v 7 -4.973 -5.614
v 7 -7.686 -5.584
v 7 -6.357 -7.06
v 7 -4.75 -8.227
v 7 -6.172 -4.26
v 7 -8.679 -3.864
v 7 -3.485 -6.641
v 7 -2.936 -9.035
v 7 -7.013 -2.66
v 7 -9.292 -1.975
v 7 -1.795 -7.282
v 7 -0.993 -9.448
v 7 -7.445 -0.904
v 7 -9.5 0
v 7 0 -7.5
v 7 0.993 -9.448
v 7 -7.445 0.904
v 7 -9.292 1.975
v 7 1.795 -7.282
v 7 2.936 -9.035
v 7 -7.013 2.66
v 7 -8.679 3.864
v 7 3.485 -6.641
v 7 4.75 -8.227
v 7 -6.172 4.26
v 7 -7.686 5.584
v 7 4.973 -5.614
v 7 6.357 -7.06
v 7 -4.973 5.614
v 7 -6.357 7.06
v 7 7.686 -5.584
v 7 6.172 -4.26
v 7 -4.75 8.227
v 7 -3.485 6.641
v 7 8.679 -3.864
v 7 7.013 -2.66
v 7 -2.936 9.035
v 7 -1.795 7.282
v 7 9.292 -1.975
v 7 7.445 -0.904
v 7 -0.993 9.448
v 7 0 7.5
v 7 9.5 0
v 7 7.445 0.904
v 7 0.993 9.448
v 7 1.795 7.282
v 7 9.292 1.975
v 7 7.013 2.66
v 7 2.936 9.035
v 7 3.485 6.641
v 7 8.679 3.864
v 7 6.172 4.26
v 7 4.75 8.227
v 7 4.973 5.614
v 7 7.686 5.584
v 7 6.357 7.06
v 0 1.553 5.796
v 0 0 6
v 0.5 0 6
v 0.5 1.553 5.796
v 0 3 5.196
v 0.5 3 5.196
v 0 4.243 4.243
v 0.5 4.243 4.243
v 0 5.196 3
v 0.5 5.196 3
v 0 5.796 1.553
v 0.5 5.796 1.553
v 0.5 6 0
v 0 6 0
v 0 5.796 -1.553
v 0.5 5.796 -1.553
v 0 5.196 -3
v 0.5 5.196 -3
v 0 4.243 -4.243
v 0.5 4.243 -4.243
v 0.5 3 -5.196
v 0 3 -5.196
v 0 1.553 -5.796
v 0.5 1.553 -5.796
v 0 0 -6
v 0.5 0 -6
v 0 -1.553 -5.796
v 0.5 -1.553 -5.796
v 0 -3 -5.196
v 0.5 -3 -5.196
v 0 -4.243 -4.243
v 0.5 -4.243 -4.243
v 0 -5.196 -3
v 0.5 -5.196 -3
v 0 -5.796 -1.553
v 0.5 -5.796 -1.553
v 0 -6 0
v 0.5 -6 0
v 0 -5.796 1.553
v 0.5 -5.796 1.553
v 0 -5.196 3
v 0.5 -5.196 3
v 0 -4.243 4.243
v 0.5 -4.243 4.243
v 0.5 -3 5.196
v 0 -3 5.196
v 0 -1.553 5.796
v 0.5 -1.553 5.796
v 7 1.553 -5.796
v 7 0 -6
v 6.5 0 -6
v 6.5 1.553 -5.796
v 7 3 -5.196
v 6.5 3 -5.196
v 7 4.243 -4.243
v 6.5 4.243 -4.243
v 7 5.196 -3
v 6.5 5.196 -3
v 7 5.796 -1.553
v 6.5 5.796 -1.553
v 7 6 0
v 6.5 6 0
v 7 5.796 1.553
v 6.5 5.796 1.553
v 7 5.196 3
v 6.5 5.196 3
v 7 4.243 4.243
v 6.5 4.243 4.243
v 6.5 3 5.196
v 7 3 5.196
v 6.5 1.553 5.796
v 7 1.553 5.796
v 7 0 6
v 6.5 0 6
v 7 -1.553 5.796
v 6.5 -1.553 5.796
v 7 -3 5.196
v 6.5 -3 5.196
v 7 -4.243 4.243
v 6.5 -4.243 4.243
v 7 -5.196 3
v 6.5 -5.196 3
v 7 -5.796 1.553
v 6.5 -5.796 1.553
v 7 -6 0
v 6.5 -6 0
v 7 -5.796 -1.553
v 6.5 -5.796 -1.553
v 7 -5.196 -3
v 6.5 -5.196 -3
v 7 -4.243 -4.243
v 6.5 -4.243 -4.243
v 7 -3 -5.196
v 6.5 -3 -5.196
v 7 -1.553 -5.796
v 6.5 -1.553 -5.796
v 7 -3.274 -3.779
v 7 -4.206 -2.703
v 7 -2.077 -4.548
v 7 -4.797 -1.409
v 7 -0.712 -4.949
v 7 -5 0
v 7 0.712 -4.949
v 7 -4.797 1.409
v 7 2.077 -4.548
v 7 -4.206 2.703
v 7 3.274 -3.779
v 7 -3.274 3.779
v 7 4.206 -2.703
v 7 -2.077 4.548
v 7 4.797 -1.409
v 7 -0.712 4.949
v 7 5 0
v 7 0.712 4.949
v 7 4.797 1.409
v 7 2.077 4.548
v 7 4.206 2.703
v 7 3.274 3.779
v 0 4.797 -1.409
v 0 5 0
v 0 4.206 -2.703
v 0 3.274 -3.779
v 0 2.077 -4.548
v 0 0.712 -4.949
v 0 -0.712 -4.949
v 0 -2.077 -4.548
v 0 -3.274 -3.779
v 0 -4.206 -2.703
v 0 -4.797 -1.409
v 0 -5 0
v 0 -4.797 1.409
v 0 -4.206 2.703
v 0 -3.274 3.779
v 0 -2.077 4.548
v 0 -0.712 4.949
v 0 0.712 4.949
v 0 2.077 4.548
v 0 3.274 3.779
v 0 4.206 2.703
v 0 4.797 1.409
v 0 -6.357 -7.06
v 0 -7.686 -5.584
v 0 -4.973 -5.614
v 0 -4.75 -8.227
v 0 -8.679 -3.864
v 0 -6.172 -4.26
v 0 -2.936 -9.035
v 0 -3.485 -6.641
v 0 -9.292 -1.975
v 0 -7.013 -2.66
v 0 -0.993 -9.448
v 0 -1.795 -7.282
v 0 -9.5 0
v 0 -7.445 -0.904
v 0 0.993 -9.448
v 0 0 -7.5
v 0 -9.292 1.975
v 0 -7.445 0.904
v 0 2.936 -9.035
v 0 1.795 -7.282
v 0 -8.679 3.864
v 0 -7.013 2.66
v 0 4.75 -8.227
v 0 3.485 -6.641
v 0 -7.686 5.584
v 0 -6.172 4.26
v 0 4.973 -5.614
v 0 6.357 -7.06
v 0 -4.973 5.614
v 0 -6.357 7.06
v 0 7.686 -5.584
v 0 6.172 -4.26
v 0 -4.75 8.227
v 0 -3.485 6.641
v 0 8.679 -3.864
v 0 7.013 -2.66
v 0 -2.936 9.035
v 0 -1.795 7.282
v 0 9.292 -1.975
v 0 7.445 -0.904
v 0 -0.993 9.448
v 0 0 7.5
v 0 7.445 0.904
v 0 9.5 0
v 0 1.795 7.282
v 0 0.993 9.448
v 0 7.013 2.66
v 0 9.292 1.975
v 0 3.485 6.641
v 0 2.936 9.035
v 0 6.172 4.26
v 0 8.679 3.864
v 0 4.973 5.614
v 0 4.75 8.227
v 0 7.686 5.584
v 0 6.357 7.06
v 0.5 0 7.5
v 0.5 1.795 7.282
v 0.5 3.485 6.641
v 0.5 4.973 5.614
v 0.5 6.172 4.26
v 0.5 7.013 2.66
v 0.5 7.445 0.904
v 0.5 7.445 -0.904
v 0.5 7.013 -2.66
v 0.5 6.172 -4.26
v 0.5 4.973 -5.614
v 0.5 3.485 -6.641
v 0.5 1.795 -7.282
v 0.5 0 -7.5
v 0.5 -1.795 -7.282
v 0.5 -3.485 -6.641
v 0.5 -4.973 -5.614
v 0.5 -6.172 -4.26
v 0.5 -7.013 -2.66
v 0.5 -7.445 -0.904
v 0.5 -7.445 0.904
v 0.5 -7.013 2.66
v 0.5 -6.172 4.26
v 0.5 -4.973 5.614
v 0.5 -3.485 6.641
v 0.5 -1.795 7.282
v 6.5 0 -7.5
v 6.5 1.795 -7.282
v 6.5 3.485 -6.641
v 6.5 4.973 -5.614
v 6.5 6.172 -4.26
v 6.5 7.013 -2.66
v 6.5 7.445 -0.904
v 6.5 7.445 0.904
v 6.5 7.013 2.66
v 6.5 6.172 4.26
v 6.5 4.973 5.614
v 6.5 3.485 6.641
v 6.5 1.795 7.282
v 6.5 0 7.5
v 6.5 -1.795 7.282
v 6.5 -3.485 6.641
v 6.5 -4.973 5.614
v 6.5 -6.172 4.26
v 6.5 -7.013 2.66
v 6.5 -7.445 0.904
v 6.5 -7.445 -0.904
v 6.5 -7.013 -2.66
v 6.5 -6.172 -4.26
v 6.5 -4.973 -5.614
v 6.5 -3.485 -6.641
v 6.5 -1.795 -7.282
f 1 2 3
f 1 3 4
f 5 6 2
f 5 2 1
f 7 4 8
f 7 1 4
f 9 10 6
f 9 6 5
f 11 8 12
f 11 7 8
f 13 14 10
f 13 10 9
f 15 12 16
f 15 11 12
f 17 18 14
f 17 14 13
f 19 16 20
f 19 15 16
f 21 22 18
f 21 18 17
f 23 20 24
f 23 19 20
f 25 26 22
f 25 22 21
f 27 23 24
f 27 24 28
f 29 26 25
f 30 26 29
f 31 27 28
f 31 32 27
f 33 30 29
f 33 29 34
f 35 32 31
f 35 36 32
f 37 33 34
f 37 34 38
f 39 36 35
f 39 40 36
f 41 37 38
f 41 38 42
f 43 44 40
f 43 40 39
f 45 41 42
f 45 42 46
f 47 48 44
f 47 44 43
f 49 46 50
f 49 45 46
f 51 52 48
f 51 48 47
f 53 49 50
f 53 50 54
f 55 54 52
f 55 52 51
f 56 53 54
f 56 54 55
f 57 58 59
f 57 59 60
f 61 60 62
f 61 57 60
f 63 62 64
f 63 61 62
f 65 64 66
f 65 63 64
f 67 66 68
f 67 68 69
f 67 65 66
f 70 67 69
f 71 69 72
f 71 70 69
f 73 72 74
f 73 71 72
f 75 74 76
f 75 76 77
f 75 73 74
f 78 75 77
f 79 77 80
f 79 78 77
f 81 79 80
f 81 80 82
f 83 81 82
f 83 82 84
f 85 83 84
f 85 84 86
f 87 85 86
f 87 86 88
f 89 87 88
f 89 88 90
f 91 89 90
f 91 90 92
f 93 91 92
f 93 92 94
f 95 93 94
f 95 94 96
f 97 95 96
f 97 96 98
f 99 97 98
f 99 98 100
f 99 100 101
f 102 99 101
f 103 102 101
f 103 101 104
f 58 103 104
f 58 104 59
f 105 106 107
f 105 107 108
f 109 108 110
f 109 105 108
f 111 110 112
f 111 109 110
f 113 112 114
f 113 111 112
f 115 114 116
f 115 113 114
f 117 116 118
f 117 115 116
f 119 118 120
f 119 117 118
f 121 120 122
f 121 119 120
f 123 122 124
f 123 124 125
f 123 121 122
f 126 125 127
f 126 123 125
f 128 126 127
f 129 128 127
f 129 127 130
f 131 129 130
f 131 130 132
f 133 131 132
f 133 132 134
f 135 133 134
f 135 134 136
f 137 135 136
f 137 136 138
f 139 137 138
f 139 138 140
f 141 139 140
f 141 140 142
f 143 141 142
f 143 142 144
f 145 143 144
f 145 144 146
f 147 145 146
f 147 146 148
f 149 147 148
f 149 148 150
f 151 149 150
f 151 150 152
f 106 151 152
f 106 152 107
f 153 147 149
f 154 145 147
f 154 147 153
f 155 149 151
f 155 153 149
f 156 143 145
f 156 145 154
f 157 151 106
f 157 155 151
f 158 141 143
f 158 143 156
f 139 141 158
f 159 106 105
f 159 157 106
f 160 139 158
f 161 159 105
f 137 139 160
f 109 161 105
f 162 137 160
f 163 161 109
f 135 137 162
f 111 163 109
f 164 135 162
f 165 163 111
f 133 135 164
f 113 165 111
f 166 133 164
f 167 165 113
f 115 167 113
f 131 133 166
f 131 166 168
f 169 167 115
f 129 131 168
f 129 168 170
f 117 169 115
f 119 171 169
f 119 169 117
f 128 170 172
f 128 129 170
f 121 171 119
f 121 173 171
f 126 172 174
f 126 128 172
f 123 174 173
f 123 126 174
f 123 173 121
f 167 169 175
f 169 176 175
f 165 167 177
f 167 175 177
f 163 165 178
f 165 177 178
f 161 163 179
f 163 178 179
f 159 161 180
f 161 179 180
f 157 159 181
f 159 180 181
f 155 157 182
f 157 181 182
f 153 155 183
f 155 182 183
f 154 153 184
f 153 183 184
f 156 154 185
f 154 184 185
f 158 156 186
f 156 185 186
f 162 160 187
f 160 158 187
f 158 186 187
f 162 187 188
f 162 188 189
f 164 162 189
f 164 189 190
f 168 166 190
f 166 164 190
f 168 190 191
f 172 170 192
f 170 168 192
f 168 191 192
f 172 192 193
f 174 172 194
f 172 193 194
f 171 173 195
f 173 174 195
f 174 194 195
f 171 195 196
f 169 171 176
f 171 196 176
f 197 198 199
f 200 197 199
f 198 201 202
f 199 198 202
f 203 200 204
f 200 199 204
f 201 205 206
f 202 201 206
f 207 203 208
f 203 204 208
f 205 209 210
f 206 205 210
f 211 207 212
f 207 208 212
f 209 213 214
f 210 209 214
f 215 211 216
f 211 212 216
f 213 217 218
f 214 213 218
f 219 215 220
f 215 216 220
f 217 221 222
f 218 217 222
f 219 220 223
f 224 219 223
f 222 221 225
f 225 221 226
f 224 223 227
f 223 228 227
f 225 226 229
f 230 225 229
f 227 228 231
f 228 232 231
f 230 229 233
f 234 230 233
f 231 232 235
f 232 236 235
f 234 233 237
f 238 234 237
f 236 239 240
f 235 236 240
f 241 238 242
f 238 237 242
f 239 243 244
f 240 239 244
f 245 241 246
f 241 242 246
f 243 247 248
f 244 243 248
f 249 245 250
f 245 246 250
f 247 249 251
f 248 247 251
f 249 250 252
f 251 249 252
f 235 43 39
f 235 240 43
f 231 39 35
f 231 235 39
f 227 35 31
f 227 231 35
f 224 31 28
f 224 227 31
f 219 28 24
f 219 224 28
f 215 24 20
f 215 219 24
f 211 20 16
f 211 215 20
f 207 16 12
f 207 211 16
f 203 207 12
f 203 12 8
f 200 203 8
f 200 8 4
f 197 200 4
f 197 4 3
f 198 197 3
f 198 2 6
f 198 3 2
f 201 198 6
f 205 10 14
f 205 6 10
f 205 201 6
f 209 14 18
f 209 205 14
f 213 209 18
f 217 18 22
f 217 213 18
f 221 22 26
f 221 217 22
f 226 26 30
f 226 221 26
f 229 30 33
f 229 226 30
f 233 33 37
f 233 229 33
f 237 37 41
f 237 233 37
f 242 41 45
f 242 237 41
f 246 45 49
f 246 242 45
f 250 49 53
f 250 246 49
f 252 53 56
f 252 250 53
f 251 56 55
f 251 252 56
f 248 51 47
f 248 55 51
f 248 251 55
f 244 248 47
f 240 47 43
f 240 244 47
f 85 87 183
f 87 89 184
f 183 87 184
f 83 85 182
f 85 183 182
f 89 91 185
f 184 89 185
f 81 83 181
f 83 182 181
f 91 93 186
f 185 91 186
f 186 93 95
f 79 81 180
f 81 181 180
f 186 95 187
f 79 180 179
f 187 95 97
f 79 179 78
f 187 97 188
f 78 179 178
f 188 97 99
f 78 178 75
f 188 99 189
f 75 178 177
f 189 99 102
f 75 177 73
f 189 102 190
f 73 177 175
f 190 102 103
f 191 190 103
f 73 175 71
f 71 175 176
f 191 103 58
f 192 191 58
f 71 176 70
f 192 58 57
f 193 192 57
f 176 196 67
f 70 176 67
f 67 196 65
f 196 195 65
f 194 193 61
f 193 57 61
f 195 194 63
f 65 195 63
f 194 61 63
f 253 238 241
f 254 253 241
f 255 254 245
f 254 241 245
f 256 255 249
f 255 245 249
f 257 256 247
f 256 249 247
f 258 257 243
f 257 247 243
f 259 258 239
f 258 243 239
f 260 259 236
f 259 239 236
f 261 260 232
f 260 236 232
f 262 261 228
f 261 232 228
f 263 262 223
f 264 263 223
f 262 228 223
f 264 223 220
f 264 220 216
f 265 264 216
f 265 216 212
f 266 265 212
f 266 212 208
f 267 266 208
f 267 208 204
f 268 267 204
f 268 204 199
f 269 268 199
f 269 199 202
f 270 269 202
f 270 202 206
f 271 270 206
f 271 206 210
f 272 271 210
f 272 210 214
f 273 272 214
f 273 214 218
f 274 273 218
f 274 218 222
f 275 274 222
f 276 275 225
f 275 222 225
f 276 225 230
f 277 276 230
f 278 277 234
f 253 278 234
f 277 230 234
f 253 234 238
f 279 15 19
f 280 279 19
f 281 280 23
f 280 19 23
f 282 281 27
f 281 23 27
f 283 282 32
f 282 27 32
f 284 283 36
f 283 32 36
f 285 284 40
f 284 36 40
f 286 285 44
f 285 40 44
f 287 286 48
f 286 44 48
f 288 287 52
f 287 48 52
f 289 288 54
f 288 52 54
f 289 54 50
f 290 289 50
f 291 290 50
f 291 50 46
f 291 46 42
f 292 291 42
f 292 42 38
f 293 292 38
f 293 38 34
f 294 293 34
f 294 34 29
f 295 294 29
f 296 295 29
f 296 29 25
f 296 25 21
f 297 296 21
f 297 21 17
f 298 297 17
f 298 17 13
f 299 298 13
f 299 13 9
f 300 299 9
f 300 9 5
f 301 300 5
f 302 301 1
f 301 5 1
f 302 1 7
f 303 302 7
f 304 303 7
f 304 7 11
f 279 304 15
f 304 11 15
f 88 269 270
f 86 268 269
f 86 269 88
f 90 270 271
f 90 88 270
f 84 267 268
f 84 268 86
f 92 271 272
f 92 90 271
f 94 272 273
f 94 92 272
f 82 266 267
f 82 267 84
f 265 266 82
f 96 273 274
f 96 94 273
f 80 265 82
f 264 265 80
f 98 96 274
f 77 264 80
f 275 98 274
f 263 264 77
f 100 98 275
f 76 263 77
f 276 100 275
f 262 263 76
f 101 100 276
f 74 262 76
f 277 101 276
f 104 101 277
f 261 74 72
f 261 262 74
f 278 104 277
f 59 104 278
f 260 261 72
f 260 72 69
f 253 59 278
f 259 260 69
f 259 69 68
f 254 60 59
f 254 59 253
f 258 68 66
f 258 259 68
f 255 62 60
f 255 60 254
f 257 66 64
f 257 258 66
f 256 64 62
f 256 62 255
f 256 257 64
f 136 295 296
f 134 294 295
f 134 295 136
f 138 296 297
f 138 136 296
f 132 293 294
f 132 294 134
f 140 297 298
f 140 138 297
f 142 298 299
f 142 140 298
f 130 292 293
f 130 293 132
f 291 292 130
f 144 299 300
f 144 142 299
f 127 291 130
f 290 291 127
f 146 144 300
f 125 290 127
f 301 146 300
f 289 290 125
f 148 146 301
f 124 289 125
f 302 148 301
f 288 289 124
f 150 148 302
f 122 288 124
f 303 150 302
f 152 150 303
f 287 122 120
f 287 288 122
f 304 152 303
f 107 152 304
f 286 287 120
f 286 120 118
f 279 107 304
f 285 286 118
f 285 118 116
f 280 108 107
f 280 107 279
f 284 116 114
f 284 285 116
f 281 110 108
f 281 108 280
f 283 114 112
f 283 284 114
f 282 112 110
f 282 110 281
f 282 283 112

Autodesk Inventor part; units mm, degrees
ref_plane "YZ Plane" through (0, 0, 0) normal (1, 0, 0) x (0, 1, 0)
ref_plane "XZ Plane" through (0, 0, 0) normal (0, 1, 0) x (-1, 0, 0)
ref_plane "XY Plane" through (0, 0, 0) normal (0, 0, 1) x (1, 0, 0)
sketch "スケッチ1" plane through (0, 0, 0) normal (1, 0, 0) x (0, 1, 0)
  circle A0 centre (0, 0) radius 5
  circle A1 centre (0, 0) radius 9.5
  dimension "d0" = 10
  dimension "d1" = 19
extrude "押し出し1" add sketch "スケッチ1" along normal blind 7
sketch "スケッチ2" plane through (7, 0, 0) normal (1, 0, 0) x (0, 0, -1)
  circle A0 centre (0, 0) radius 6
  circle A1 centre (0, 0) radius 7.5
  dimension "d4" = 12
  dimension "d5" = 15
extrude "押し出し2" cut sketch "スケッチ2" against normal blind 0.5
sketch "スケッチ3" plane through (0, 0, 0) normal (-1, 0, 0) x (0, 0, 1)
  circle A0 centre (0, 0) radius 6
  circle A1 centre (0, 0) radius 7.5
  dimension "d8" = 12
  dimension "d9" = 15
extrude "押し出し3" cut sketch "スケッチ3" against normal blind 0.5
properties part number "Bearing_626ZZ" material "ステンレス鋼"
